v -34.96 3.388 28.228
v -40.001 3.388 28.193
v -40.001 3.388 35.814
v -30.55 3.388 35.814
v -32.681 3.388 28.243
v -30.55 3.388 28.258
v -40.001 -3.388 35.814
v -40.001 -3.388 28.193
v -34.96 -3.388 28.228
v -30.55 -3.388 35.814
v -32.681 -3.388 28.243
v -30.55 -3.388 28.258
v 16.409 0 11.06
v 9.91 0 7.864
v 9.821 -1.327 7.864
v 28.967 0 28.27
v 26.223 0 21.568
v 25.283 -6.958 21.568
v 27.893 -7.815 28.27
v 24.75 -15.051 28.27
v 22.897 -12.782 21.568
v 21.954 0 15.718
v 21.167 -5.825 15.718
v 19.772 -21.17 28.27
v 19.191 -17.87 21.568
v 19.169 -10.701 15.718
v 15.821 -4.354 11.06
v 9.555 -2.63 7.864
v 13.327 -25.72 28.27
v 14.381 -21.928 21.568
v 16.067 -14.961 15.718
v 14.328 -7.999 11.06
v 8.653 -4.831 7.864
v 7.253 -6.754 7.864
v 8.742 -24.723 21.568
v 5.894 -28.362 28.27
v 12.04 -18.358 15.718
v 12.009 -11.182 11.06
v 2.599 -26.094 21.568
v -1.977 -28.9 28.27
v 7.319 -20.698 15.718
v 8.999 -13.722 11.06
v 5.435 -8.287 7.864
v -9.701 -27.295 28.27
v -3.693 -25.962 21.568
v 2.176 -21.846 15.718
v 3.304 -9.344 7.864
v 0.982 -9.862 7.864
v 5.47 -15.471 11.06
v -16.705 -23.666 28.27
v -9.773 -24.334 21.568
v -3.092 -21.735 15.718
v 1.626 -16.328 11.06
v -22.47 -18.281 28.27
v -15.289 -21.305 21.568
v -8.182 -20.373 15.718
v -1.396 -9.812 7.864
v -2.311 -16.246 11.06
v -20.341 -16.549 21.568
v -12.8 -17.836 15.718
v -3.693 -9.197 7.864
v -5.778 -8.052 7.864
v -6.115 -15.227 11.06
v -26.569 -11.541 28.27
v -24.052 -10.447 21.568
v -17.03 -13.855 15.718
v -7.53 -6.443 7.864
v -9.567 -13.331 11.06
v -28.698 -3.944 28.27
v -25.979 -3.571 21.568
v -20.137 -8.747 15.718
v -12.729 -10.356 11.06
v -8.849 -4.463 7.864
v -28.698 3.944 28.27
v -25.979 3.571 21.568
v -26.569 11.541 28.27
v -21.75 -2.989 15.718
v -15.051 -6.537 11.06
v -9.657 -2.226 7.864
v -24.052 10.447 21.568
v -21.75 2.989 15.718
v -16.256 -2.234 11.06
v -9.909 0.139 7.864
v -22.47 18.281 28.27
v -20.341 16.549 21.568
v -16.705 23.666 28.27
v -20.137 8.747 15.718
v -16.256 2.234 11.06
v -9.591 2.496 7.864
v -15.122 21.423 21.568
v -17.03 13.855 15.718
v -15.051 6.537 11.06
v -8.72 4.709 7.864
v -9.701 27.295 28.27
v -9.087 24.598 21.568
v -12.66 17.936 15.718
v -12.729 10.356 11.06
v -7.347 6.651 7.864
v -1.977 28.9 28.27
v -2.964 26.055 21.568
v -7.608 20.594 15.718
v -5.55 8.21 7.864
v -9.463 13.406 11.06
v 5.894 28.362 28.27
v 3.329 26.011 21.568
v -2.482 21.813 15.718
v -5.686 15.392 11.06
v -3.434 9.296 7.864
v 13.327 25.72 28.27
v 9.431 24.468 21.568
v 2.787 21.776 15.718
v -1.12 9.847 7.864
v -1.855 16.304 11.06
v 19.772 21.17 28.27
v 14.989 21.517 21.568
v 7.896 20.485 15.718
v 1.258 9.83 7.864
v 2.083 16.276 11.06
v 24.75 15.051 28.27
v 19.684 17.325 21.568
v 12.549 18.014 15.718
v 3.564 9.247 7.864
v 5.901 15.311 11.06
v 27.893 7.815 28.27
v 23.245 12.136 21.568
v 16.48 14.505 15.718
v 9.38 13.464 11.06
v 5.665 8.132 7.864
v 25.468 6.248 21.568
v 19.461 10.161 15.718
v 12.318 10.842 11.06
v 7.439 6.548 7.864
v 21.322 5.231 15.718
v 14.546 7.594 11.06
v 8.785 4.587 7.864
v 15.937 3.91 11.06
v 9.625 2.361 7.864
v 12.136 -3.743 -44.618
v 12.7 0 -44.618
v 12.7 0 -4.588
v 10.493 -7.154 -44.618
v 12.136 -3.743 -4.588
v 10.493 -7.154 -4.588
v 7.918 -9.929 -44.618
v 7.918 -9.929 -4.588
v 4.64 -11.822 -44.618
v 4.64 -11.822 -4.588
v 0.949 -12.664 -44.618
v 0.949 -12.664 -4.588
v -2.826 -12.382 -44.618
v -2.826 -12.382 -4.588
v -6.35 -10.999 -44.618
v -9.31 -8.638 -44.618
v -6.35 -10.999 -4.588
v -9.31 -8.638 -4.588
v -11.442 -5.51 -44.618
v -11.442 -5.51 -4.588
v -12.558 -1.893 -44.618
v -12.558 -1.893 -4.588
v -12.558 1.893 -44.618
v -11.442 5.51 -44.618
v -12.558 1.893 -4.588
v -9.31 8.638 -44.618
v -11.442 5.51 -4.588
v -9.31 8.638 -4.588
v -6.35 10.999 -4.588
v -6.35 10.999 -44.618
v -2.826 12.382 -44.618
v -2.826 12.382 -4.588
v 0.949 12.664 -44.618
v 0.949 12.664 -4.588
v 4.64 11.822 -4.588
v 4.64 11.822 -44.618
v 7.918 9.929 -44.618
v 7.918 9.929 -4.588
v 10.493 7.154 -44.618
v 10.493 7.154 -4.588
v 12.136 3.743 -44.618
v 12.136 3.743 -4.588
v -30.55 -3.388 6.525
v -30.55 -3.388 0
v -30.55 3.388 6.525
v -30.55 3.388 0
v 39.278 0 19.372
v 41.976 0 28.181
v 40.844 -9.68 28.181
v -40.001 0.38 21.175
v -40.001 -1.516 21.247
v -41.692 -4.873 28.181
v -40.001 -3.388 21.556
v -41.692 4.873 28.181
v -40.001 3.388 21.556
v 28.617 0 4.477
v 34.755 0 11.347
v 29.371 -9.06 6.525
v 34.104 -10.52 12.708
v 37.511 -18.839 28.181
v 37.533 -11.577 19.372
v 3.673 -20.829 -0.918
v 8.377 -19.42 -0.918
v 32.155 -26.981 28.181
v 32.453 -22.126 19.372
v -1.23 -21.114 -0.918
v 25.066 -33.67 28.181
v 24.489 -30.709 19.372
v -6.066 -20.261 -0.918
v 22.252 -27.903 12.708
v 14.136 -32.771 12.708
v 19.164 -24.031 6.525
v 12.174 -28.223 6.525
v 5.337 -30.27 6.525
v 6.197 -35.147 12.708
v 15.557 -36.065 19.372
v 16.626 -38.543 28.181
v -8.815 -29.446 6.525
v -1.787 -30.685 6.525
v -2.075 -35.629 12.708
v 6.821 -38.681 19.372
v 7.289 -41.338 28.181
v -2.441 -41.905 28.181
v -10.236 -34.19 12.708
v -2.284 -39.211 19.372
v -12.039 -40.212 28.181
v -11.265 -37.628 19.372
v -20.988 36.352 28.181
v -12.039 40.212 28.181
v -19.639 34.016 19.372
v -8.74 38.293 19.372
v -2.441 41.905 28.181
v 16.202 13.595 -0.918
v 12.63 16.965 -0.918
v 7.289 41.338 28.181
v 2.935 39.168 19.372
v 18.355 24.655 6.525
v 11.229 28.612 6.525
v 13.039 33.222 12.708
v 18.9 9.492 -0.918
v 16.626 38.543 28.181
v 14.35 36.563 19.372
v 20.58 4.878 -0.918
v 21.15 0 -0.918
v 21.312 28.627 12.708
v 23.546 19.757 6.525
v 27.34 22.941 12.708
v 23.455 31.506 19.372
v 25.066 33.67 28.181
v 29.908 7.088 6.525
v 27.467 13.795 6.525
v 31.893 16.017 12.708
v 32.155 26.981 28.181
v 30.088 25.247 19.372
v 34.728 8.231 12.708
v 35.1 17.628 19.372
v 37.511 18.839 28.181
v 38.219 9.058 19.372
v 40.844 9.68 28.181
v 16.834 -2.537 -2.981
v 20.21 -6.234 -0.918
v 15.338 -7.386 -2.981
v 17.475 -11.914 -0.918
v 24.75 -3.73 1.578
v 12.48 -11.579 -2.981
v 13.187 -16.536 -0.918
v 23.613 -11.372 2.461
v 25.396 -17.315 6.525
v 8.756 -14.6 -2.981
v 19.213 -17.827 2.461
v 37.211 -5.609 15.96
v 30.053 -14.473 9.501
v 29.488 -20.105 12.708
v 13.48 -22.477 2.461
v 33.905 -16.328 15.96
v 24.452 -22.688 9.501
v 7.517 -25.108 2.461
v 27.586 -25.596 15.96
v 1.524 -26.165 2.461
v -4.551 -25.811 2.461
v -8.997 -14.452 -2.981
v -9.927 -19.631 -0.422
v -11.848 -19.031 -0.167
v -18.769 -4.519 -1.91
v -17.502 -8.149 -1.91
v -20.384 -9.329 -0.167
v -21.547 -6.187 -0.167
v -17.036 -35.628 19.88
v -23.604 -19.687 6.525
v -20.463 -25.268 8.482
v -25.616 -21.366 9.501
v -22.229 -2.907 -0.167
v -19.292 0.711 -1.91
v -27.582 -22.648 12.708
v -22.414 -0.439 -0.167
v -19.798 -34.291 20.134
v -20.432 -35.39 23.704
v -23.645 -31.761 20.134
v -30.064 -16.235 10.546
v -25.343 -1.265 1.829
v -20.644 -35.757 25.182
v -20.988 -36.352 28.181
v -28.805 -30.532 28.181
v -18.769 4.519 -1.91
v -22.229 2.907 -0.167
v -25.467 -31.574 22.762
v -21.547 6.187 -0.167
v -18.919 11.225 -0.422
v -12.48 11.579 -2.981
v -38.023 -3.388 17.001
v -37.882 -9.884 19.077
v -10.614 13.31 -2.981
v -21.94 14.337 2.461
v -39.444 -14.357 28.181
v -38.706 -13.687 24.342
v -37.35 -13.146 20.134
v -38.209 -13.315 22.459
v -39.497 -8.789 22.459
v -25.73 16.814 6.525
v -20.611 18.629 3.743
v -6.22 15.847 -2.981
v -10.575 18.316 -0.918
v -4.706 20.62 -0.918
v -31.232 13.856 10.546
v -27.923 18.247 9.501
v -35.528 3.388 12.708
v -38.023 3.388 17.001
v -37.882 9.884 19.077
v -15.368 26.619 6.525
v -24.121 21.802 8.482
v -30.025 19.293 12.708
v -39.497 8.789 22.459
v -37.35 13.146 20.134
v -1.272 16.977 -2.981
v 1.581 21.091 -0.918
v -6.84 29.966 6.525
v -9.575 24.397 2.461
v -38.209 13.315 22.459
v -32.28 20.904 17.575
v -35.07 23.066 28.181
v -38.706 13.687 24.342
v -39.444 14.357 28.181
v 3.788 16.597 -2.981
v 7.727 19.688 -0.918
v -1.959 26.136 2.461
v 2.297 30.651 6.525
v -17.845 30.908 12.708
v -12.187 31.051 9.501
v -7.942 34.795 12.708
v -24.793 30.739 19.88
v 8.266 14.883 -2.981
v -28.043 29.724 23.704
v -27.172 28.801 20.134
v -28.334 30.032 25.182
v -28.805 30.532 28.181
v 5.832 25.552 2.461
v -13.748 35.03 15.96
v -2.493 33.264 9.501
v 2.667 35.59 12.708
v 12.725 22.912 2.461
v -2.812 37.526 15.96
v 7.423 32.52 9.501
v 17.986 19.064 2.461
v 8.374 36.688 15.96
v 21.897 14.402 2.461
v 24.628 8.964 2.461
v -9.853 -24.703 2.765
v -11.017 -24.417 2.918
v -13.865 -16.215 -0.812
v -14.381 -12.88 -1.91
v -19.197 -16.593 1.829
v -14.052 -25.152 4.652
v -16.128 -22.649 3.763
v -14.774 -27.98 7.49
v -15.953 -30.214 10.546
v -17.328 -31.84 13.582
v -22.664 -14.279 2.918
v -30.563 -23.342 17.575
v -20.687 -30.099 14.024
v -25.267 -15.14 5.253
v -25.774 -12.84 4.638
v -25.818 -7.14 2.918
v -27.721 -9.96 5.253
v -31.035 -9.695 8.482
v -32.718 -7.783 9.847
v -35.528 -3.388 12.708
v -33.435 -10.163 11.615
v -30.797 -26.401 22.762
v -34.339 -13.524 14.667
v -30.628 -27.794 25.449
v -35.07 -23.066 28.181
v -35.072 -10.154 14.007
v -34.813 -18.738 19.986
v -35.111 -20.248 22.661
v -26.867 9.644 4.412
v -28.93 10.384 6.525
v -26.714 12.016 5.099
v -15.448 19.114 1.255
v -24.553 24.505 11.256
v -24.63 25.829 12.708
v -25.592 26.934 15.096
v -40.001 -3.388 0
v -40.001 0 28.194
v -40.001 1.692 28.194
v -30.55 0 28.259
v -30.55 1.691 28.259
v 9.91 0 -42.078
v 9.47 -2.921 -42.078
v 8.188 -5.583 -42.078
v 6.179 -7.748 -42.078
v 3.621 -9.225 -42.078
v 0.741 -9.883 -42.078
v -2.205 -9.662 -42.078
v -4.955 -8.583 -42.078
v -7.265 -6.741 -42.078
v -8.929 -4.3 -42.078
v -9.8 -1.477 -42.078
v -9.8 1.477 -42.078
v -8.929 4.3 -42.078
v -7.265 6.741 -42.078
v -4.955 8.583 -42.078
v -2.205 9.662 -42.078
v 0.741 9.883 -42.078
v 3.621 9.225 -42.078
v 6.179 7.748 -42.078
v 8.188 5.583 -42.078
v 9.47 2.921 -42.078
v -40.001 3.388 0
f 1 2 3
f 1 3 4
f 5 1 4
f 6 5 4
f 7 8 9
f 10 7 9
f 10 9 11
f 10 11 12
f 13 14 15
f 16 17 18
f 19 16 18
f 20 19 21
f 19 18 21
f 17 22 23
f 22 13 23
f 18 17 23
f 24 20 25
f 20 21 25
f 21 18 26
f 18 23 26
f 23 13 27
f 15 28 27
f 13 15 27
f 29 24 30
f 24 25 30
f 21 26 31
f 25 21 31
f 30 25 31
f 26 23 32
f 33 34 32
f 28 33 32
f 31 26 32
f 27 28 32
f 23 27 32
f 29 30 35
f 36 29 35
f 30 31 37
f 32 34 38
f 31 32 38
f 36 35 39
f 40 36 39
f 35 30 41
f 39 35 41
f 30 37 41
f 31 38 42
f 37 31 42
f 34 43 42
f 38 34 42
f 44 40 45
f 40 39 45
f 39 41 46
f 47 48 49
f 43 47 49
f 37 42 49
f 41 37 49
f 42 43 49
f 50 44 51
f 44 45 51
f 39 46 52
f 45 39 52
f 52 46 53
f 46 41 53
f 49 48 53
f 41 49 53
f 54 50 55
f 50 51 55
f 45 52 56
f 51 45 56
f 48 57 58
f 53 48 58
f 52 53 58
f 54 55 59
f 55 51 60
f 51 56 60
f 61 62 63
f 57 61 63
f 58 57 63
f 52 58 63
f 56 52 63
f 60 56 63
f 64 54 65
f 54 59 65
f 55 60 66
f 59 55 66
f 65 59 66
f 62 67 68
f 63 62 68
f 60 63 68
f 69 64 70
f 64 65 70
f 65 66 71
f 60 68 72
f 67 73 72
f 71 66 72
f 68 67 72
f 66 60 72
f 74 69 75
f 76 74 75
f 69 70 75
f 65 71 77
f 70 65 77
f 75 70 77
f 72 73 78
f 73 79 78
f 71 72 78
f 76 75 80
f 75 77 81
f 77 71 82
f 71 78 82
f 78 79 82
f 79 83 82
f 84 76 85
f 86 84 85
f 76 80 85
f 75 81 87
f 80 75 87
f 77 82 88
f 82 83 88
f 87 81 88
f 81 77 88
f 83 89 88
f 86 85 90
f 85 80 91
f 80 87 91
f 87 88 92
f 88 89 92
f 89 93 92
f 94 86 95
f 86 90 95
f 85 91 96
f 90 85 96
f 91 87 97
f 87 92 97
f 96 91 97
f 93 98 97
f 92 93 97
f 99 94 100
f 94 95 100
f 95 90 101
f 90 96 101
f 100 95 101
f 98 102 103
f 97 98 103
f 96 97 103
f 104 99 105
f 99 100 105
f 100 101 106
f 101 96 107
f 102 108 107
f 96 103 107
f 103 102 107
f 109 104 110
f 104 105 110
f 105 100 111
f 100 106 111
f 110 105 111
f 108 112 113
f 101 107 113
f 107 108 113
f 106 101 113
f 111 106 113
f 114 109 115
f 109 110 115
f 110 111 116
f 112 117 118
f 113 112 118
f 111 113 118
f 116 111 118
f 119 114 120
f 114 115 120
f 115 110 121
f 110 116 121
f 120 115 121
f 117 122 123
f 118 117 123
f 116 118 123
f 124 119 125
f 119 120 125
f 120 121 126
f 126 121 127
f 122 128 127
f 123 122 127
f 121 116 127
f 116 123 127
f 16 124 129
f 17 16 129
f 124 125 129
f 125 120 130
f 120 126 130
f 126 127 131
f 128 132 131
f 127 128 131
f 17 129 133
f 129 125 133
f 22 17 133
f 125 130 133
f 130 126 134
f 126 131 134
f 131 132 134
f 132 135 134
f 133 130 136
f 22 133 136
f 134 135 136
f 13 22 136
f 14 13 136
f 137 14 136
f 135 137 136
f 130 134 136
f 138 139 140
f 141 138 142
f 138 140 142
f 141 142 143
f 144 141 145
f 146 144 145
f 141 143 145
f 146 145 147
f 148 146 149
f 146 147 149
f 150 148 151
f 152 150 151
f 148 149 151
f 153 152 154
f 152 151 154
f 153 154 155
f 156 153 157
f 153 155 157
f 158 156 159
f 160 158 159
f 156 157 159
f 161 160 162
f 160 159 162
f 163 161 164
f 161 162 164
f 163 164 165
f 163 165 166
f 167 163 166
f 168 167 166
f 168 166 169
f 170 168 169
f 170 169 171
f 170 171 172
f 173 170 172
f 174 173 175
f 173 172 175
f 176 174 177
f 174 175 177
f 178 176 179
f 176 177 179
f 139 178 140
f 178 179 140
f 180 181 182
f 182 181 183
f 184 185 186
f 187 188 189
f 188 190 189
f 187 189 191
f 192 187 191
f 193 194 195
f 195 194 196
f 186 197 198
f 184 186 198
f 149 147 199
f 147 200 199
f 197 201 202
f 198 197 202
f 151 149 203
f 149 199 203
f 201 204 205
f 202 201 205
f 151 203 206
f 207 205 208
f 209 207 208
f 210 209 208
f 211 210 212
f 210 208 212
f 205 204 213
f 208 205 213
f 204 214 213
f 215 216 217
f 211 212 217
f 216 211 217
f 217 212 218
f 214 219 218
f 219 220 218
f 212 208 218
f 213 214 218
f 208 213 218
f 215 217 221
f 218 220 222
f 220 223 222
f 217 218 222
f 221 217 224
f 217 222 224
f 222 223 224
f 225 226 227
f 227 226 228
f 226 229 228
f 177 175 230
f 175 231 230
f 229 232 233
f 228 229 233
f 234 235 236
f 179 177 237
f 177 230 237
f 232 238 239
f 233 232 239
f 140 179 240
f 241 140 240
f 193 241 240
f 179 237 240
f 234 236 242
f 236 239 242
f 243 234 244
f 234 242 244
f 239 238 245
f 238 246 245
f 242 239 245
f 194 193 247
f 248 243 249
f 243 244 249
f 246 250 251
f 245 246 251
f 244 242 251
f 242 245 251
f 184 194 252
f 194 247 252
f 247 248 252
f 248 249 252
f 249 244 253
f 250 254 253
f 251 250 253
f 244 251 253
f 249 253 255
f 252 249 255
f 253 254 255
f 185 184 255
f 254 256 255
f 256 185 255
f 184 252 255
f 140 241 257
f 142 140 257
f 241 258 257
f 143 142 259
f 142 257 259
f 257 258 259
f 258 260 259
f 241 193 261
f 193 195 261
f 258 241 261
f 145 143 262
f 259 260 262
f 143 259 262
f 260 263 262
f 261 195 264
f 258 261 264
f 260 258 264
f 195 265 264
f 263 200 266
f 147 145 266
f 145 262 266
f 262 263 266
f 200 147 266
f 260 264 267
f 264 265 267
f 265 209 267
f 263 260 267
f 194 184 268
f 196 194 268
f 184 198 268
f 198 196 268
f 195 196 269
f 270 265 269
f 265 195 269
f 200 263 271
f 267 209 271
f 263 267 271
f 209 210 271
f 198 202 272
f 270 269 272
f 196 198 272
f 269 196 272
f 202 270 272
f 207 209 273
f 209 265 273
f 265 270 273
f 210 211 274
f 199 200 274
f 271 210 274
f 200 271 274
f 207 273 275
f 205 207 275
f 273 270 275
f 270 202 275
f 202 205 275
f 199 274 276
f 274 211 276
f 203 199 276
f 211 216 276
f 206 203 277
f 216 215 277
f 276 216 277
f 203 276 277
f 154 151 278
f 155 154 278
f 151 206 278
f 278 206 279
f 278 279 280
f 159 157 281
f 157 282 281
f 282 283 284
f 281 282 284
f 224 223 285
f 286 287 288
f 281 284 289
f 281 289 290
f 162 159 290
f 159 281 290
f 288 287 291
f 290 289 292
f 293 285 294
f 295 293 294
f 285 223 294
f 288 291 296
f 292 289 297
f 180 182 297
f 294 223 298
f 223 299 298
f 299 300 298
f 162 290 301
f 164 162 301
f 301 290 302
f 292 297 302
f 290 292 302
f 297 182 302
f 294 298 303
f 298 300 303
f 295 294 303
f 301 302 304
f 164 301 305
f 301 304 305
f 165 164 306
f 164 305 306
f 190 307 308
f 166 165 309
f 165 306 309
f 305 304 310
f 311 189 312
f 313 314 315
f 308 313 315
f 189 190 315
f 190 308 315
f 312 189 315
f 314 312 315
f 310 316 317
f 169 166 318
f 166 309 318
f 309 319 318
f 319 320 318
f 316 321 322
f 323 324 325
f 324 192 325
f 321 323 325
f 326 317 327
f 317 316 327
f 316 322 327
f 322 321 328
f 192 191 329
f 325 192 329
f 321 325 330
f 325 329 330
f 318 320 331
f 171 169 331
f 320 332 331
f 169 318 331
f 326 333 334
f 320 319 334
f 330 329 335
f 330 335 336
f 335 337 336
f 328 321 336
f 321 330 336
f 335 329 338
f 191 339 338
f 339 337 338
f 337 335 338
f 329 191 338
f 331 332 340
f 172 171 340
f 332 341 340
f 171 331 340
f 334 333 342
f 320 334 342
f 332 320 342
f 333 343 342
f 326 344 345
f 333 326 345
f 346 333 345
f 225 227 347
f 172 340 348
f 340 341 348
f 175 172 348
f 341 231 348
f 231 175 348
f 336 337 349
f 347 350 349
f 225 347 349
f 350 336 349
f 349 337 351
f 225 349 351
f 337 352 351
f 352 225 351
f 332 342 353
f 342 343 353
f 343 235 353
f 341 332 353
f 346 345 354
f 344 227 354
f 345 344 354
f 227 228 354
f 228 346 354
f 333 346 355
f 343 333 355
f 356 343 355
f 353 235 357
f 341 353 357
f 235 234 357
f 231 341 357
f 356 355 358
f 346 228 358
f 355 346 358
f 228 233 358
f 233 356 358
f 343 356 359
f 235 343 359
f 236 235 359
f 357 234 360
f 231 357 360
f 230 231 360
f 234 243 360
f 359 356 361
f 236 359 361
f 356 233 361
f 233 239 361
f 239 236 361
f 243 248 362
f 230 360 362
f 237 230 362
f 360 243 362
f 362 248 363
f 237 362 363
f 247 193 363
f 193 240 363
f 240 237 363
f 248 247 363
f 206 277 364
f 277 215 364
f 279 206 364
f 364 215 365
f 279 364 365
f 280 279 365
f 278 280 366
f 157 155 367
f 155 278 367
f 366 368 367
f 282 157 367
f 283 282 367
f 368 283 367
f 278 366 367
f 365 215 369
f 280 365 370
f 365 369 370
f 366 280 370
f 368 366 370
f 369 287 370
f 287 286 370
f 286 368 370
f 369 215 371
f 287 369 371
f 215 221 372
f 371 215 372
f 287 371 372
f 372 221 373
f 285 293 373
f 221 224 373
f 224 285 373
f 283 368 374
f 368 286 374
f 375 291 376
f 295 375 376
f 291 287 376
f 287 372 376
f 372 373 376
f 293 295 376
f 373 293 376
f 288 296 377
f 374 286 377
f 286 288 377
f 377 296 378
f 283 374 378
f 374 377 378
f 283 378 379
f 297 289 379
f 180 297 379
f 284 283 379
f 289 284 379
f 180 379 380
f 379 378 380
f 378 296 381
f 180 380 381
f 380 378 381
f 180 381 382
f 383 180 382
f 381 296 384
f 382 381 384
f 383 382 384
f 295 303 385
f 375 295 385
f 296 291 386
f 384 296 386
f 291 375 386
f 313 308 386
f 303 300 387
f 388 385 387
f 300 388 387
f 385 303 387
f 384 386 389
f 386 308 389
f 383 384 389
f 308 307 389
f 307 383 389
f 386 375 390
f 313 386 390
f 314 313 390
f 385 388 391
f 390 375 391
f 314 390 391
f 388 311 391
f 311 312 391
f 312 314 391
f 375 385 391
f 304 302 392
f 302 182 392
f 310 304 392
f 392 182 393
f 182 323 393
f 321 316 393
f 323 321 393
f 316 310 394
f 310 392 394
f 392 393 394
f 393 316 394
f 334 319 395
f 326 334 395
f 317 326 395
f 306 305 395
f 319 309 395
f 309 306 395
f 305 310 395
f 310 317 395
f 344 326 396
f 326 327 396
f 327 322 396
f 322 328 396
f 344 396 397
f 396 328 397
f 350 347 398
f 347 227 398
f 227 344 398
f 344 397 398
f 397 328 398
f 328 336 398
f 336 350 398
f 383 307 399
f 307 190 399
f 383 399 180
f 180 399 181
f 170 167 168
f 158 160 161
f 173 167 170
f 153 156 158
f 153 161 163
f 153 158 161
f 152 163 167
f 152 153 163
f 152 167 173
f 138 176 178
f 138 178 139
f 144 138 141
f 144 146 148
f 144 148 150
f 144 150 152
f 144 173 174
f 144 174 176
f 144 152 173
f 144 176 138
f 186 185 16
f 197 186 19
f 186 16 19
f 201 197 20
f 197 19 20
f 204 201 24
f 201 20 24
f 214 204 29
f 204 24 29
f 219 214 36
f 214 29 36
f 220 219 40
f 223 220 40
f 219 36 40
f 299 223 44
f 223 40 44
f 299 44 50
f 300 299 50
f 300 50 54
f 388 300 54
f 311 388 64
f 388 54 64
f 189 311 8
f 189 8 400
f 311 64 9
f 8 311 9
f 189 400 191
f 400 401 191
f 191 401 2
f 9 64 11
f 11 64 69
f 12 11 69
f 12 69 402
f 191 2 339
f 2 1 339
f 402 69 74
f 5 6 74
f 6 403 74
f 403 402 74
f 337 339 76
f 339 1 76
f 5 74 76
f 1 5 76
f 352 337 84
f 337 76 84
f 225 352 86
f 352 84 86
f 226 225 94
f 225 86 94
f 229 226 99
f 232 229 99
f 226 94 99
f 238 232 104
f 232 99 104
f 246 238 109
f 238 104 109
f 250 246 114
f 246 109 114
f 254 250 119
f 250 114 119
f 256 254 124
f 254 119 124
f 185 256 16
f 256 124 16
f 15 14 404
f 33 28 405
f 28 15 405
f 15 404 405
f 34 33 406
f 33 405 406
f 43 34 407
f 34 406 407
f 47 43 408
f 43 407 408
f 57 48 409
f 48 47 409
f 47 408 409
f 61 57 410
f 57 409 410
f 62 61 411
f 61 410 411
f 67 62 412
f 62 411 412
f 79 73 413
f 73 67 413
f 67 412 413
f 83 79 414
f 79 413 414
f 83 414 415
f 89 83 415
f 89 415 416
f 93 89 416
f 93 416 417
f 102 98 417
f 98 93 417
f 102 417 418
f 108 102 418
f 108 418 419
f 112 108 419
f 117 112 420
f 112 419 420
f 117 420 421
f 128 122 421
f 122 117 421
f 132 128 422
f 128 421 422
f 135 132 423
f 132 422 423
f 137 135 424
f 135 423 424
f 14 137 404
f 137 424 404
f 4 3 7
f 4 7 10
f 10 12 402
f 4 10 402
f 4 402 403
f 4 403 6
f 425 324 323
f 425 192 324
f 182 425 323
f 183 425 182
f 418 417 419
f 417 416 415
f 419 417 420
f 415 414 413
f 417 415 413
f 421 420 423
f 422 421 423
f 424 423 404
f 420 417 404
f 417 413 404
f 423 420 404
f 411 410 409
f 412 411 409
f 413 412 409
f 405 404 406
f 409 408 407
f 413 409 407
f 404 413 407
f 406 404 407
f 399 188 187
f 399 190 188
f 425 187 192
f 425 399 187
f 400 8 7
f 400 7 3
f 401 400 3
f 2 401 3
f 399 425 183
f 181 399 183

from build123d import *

# Parameters (mm, degrees)
F2_R     = 9.910434
F3_DEPTH = 72.889528
F4_DEPTH = 2.54
F5_W     = 9.451408
F5_H     = 6.77502
F6_DEPTH = 35.814


with BuildPart() as f1:
    # F0 (on Front) → F1 (revolve)
    with BuildSketch(Plane.XZ):
        with BuildLine():
            ThreePointArc((28.967492, 28.270211), (18.214134, 12.333816), (0, 6.181683))
            Line((0, 6.181683), (0, -44.618317))
            Line((0, -44.618317), (12.7, -44.618317))
            Line((12.7, -44.618317), (12.7, -4.587781))
            ThreePointArc((12.7, -4.587781), (31.871676, 7.74599), (41.975688, 28.180862))
            Line((41.975688, 28.180862), (28.967492, 28.270211))
        make_face()
    revolve(axis=Axis((0, 0, -19.218317), (0, 0, -1)))

    # F2 (on face) → F3 (cut, through all)
    with BuildSketch(Plane(origin=(0, 0, -44.618317), x_dir=(1, 0, 0), z_dir=(0, 0, -1))):
        Circle(F2_R)
    extrude(amount=-F3_DEPTH, mode=Mode.SUBTRACT)

    # F2 (on face) → F4 (join)
    with BuildSketch(Plane(origin=(0, 0, -44.618317), x_dir=(1, 0, 0), z_dir=(0, 0, -1))):
        Circle(F2_R)
    extrude(amount=-F4_DEPTH)

    # F5 (on Top) → F6 (join)
    with BuildSketch(Plane.XY):
        with Locations((-35.275344, 0)):
            Rectangle(F5_W, F5_H)
    extrude(amount=F6_DEPTH)


solid = f1.part
